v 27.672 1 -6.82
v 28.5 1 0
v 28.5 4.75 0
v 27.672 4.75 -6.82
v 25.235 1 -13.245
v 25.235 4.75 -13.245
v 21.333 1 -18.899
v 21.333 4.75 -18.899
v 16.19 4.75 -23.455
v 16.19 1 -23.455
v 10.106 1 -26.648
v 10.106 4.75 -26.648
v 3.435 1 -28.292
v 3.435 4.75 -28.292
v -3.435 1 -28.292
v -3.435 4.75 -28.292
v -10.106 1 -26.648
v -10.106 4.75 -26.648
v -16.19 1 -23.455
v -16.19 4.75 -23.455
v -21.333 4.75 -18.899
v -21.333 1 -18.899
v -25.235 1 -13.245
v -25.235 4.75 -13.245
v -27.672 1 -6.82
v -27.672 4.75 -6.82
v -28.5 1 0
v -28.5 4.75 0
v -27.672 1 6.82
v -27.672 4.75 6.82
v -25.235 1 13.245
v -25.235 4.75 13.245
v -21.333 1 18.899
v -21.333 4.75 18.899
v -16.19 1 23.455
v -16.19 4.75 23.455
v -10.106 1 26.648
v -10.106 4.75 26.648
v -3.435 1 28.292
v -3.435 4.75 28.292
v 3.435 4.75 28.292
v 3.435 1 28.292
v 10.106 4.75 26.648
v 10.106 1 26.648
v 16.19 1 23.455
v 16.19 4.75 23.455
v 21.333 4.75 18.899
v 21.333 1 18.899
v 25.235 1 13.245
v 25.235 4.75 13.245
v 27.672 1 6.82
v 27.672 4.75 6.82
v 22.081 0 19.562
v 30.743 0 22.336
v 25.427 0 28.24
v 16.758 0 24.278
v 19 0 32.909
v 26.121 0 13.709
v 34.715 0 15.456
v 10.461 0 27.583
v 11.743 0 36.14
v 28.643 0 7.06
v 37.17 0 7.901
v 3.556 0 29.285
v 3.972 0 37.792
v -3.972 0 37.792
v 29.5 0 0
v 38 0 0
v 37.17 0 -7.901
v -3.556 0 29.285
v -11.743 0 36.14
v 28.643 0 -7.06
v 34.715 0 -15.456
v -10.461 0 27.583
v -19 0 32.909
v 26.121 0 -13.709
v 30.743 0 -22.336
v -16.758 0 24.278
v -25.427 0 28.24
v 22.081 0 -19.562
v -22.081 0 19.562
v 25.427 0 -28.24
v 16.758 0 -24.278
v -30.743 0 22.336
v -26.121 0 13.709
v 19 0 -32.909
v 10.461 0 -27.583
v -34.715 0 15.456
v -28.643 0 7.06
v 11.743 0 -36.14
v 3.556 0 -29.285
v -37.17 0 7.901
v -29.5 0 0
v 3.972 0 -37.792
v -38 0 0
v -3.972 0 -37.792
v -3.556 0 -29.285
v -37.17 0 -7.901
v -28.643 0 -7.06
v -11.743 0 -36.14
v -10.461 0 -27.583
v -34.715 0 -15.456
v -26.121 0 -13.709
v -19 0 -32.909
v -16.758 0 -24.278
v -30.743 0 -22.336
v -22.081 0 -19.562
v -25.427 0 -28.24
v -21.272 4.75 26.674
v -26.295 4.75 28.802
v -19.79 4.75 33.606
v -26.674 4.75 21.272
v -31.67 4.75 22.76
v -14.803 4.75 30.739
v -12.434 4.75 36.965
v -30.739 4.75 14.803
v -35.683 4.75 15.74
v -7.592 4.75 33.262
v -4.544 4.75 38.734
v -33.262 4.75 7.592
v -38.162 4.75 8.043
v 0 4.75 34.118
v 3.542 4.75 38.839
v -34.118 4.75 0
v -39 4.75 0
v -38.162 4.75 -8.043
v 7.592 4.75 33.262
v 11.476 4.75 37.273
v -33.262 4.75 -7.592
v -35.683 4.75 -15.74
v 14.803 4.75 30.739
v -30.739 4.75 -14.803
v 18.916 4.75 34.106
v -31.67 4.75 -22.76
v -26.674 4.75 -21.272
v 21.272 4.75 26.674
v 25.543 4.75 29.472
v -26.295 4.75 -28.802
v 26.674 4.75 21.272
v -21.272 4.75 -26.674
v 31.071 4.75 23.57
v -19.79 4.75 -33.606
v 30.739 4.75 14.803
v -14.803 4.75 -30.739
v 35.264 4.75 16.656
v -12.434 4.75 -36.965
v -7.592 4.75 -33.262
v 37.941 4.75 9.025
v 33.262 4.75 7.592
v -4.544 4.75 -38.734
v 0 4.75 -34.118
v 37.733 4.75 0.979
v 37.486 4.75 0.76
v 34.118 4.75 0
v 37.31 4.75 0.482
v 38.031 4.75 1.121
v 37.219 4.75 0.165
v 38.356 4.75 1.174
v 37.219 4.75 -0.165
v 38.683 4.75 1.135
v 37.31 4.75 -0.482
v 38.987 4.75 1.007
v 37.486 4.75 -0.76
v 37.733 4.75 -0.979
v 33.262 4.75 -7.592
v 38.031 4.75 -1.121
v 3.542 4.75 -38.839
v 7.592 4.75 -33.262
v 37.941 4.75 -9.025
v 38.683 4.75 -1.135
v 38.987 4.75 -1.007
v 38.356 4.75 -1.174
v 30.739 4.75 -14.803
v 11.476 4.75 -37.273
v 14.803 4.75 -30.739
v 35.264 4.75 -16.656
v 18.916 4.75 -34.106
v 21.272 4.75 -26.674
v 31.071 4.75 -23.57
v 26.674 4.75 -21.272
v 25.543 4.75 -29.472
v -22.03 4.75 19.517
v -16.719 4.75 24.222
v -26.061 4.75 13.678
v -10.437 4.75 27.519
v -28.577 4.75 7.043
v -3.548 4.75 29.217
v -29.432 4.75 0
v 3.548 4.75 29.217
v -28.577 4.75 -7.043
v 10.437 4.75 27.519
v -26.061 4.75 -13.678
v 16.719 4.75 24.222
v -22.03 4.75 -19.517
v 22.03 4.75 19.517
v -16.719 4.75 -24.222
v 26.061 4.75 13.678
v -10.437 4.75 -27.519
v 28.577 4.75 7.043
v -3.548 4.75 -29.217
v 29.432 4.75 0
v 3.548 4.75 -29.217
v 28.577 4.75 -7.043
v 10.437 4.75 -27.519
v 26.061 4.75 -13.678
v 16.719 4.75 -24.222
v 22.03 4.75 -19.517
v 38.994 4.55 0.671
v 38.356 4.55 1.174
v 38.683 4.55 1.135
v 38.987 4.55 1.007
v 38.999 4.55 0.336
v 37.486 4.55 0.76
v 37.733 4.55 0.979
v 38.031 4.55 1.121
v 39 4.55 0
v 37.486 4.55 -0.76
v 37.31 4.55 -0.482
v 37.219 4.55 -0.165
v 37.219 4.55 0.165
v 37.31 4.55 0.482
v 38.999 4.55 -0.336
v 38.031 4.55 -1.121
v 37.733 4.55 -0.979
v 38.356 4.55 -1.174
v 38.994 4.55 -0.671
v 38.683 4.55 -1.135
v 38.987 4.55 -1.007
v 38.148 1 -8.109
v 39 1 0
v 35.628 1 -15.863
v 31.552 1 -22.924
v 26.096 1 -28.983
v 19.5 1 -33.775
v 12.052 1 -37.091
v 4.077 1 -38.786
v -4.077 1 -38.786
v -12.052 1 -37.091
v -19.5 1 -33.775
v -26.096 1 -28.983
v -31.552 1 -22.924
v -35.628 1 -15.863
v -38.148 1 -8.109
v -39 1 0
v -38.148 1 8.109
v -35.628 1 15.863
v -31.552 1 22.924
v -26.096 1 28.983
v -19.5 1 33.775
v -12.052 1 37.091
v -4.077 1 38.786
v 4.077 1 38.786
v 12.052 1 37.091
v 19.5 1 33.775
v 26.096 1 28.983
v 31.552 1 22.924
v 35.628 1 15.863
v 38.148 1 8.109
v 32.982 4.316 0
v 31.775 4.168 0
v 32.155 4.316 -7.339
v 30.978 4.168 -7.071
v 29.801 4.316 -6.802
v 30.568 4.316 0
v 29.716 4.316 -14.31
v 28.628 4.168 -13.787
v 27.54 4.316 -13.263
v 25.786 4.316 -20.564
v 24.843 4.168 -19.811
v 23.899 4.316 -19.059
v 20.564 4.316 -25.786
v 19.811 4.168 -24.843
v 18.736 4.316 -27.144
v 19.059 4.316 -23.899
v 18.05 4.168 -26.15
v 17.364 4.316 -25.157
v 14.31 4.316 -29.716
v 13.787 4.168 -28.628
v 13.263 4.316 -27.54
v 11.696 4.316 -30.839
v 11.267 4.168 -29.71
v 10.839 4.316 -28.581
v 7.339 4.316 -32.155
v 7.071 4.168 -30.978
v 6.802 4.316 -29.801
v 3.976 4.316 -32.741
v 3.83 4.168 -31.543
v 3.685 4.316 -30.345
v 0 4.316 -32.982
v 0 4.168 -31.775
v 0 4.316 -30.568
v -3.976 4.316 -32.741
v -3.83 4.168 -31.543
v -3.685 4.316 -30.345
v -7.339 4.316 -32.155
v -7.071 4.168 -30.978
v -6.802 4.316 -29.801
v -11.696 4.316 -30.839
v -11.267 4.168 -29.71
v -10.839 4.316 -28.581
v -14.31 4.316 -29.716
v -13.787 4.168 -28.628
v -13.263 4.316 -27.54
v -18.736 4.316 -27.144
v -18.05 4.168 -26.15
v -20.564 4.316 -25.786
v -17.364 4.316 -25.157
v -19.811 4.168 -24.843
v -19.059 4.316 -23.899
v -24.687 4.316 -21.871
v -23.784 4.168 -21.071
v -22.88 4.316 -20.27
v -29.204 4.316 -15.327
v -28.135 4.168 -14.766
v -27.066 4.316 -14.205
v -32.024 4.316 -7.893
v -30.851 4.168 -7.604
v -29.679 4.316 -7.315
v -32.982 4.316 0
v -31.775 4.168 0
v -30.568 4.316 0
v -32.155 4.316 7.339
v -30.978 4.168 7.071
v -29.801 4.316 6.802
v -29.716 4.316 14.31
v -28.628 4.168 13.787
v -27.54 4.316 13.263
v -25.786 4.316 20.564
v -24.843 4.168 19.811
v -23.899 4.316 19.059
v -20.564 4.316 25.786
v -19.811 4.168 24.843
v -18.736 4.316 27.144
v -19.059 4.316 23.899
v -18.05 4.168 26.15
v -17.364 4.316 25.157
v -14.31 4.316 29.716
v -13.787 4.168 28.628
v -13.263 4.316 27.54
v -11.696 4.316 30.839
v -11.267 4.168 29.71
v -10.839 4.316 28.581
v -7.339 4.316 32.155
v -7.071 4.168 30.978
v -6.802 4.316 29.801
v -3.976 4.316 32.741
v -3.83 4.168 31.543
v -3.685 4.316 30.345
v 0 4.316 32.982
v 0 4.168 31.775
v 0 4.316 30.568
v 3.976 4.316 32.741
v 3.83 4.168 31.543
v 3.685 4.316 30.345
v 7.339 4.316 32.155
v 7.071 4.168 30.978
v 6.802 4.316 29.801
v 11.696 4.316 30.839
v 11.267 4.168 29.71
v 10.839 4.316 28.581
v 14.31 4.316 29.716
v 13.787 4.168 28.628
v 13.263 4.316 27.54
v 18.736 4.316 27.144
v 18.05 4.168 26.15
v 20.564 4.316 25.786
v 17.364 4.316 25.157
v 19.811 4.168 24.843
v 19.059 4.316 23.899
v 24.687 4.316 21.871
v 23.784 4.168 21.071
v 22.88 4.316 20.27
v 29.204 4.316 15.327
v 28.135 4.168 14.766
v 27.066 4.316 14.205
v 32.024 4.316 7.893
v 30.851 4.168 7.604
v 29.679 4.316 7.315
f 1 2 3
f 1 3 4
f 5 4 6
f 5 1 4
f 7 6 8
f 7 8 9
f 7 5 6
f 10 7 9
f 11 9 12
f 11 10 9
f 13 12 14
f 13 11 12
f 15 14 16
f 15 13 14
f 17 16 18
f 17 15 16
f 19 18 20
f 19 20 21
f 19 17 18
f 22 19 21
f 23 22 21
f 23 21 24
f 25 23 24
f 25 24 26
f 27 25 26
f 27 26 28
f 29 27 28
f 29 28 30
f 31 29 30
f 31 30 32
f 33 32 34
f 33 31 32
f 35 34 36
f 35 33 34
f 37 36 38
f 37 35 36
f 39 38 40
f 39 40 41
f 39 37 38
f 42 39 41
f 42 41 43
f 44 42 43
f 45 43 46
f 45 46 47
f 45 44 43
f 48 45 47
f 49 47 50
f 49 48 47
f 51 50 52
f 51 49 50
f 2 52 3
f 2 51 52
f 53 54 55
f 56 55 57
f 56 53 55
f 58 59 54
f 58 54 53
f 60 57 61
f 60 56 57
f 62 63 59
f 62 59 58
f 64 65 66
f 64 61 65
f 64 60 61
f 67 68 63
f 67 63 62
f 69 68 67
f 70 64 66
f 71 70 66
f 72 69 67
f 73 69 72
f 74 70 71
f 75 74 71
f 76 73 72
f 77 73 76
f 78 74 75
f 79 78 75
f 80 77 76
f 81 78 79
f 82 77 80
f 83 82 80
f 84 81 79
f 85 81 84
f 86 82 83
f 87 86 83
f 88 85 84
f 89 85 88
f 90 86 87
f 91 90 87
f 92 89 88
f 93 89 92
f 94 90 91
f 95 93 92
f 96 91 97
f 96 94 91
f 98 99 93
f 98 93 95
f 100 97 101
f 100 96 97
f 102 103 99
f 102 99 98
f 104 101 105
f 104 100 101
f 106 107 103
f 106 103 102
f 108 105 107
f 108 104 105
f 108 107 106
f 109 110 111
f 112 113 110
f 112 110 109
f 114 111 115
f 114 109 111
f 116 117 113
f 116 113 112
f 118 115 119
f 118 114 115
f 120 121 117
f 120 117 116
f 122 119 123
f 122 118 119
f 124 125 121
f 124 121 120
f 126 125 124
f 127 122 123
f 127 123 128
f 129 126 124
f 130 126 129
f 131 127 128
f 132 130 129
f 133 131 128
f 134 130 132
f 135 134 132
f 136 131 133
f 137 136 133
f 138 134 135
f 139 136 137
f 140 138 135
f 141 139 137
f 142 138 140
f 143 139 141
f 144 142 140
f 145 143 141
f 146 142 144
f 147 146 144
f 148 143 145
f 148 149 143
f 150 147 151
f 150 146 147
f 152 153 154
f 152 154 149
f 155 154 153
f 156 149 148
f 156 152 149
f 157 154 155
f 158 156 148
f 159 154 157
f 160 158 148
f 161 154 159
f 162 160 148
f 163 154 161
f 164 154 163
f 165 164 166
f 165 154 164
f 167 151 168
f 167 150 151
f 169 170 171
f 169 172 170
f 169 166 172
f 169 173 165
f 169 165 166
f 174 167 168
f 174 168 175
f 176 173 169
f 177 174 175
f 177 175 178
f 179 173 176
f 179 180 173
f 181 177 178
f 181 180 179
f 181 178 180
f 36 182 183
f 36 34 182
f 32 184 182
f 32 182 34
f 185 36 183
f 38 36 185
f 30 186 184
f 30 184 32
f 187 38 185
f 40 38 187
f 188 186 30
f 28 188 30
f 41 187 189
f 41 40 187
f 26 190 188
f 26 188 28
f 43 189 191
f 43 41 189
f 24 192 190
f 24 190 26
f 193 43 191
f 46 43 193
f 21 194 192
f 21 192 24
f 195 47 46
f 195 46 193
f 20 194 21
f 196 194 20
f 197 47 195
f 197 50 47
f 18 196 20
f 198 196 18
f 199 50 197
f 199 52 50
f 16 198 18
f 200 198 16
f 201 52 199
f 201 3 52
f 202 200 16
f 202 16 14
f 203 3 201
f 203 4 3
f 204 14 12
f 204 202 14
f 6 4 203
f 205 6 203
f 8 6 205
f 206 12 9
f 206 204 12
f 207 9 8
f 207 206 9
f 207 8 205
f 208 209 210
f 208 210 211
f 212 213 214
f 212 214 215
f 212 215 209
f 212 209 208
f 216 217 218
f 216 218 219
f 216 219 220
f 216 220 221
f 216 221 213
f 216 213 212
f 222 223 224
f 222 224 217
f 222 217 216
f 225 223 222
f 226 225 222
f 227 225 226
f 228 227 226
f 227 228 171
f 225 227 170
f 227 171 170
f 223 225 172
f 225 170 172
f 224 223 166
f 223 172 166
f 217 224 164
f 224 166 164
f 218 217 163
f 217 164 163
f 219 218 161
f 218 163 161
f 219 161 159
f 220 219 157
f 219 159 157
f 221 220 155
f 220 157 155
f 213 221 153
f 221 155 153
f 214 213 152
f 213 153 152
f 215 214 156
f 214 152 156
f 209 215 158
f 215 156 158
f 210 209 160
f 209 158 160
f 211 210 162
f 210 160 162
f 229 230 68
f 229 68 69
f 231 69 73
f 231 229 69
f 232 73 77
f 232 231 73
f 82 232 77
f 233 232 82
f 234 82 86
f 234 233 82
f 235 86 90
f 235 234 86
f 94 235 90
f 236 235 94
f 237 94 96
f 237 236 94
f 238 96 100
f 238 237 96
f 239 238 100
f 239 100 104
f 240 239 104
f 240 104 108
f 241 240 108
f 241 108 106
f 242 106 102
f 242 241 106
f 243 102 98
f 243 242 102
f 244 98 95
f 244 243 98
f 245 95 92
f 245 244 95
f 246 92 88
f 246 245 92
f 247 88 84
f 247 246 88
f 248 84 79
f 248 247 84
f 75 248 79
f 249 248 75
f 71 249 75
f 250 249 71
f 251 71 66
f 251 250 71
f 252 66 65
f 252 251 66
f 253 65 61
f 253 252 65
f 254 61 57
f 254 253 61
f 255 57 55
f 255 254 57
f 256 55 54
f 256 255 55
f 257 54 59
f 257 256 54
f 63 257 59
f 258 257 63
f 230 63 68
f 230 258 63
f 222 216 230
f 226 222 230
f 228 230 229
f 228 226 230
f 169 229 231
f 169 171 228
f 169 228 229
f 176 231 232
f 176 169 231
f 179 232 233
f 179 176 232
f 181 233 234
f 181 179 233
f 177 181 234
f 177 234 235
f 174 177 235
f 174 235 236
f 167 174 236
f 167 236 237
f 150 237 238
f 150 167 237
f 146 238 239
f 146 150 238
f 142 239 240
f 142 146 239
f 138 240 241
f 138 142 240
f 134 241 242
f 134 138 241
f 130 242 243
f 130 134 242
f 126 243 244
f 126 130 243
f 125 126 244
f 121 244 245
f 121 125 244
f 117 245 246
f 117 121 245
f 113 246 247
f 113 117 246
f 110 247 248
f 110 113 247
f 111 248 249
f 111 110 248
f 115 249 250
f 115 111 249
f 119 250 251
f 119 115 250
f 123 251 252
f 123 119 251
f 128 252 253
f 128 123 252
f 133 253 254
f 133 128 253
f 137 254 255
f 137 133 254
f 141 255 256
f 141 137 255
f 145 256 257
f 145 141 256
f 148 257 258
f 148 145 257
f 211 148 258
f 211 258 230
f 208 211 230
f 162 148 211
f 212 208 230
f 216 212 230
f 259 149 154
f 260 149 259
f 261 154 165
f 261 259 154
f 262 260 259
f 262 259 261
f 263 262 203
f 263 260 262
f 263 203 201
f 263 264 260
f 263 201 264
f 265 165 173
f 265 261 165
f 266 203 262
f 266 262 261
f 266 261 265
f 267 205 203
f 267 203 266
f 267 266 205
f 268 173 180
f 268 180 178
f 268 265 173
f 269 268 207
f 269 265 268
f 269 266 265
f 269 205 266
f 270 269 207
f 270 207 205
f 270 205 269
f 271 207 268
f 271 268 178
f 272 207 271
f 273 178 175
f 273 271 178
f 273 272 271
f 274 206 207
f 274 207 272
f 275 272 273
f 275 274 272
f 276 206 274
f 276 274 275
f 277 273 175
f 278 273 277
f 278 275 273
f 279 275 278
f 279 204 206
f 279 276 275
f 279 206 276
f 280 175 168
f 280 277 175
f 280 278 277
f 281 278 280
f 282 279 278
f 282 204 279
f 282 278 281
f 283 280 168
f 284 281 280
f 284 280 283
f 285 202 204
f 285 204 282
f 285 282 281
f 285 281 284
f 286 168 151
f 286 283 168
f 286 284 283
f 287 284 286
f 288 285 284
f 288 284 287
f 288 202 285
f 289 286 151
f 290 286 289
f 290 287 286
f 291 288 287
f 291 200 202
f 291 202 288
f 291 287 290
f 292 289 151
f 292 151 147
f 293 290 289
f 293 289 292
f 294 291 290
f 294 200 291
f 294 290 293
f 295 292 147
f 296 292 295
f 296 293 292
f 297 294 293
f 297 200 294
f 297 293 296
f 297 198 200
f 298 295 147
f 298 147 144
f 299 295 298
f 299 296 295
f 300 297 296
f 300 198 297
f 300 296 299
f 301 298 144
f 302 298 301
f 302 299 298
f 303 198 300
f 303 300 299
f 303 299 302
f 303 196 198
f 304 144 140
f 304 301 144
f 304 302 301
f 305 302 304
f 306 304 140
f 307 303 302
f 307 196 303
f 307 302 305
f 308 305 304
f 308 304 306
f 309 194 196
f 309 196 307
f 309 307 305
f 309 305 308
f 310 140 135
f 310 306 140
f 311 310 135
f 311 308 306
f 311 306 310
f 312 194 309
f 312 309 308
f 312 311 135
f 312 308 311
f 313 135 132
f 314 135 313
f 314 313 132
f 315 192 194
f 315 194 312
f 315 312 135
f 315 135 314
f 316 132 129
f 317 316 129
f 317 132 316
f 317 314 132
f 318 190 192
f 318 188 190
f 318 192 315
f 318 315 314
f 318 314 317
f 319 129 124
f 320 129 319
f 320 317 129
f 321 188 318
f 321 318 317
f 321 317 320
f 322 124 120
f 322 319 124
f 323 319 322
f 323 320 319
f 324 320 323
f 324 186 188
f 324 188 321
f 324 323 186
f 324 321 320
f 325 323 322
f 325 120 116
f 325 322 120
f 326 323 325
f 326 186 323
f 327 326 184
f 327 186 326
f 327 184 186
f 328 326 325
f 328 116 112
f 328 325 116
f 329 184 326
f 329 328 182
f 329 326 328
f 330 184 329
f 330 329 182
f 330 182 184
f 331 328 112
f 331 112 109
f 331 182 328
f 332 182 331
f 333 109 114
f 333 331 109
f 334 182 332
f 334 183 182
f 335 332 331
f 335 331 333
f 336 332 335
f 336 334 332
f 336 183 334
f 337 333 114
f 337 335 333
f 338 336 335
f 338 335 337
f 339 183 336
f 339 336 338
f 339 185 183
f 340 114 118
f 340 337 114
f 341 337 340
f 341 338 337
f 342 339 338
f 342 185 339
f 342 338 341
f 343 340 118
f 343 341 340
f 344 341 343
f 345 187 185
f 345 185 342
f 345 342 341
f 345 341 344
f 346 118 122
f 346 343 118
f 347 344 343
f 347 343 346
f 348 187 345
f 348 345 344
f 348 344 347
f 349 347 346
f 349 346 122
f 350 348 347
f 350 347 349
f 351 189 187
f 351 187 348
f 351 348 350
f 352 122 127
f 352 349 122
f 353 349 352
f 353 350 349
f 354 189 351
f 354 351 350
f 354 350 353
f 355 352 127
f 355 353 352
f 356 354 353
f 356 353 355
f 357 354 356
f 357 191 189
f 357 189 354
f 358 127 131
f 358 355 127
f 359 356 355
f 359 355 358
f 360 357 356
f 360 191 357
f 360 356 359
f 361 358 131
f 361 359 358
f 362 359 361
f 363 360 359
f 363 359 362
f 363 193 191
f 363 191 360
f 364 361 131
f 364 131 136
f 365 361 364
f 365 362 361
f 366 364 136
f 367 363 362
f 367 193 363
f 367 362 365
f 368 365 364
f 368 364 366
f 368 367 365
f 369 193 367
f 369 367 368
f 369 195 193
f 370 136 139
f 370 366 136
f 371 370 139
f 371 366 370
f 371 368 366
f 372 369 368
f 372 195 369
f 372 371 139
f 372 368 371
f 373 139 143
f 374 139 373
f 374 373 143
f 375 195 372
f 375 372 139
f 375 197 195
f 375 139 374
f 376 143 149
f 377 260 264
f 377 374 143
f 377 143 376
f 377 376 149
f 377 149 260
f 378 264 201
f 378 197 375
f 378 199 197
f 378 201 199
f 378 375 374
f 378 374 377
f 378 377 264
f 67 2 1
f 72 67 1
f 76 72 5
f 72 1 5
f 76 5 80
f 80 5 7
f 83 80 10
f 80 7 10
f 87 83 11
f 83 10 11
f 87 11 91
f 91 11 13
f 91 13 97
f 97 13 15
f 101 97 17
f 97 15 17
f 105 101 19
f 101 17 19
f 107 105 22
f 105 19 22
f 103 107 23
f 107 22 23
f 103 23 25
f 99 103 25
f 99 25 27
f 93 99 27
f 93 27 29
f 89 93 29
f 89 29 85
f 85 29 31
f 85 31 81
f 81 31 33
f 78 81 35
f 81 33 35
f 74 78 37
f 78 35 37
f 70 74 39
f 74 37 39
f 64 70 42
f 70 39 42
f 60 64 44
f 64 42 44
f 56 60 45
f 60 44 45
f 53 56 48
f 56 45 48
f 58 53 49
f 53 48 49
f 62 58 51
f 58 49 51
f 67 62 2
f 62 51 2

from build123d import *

# Parameters (mm, degrees)
SKETCH3_R          = 1.174710487
CUT_EXTRUDE1_DEPTH = 0.2
CHAMFER1_SIZE      = 1


with BuildPart() as part:
    # Sketch2 → Revolve1 (revolve)
    with BuildSketch(Plane.XY):
        with BuildLine():
            Line((28.5, 0), (39, 0))
            Line((39, 0), (39, 4.75))
            Line((39, 4.75), (34.117811535, 4.75))
            ThreePointArc((34.117811535, 4.75), (31.774779013, 4.167788181), (29.431746492, 4.75))
            Line((29.431746492, 4.75), (28.5, 4.75))
            Line((28.5, 4.75), (28.5, 0))
        make_face()
    revolve(axis=Axis((0, 0, 0), (0, 1, 0)))

    # Sketch3 → Cut-Extrude1 (cut)
    with BuildSketch(Plane(origin=(0, 4.75, 0), x_dir=(1, 0, 0), z_dir=(0, 1, 0))):
        with Locations((38.381757848, 0)):
            Circle(SKETCH3_R)
    extrude(amount=-CUT_EXTRUDE1_DEPTH, mode=Mode.SUBTRACT)

    # Chamfer1
    chamfer1_edges = [part.edges().sort_by_distance(p)[0] for p in [
        (-39, 0, 0),
        (-28.5, 0, 0),
    ]]
    chamfer(chamfer1_edges, length=CHAMFER1_SIZE)


solid = part.part
